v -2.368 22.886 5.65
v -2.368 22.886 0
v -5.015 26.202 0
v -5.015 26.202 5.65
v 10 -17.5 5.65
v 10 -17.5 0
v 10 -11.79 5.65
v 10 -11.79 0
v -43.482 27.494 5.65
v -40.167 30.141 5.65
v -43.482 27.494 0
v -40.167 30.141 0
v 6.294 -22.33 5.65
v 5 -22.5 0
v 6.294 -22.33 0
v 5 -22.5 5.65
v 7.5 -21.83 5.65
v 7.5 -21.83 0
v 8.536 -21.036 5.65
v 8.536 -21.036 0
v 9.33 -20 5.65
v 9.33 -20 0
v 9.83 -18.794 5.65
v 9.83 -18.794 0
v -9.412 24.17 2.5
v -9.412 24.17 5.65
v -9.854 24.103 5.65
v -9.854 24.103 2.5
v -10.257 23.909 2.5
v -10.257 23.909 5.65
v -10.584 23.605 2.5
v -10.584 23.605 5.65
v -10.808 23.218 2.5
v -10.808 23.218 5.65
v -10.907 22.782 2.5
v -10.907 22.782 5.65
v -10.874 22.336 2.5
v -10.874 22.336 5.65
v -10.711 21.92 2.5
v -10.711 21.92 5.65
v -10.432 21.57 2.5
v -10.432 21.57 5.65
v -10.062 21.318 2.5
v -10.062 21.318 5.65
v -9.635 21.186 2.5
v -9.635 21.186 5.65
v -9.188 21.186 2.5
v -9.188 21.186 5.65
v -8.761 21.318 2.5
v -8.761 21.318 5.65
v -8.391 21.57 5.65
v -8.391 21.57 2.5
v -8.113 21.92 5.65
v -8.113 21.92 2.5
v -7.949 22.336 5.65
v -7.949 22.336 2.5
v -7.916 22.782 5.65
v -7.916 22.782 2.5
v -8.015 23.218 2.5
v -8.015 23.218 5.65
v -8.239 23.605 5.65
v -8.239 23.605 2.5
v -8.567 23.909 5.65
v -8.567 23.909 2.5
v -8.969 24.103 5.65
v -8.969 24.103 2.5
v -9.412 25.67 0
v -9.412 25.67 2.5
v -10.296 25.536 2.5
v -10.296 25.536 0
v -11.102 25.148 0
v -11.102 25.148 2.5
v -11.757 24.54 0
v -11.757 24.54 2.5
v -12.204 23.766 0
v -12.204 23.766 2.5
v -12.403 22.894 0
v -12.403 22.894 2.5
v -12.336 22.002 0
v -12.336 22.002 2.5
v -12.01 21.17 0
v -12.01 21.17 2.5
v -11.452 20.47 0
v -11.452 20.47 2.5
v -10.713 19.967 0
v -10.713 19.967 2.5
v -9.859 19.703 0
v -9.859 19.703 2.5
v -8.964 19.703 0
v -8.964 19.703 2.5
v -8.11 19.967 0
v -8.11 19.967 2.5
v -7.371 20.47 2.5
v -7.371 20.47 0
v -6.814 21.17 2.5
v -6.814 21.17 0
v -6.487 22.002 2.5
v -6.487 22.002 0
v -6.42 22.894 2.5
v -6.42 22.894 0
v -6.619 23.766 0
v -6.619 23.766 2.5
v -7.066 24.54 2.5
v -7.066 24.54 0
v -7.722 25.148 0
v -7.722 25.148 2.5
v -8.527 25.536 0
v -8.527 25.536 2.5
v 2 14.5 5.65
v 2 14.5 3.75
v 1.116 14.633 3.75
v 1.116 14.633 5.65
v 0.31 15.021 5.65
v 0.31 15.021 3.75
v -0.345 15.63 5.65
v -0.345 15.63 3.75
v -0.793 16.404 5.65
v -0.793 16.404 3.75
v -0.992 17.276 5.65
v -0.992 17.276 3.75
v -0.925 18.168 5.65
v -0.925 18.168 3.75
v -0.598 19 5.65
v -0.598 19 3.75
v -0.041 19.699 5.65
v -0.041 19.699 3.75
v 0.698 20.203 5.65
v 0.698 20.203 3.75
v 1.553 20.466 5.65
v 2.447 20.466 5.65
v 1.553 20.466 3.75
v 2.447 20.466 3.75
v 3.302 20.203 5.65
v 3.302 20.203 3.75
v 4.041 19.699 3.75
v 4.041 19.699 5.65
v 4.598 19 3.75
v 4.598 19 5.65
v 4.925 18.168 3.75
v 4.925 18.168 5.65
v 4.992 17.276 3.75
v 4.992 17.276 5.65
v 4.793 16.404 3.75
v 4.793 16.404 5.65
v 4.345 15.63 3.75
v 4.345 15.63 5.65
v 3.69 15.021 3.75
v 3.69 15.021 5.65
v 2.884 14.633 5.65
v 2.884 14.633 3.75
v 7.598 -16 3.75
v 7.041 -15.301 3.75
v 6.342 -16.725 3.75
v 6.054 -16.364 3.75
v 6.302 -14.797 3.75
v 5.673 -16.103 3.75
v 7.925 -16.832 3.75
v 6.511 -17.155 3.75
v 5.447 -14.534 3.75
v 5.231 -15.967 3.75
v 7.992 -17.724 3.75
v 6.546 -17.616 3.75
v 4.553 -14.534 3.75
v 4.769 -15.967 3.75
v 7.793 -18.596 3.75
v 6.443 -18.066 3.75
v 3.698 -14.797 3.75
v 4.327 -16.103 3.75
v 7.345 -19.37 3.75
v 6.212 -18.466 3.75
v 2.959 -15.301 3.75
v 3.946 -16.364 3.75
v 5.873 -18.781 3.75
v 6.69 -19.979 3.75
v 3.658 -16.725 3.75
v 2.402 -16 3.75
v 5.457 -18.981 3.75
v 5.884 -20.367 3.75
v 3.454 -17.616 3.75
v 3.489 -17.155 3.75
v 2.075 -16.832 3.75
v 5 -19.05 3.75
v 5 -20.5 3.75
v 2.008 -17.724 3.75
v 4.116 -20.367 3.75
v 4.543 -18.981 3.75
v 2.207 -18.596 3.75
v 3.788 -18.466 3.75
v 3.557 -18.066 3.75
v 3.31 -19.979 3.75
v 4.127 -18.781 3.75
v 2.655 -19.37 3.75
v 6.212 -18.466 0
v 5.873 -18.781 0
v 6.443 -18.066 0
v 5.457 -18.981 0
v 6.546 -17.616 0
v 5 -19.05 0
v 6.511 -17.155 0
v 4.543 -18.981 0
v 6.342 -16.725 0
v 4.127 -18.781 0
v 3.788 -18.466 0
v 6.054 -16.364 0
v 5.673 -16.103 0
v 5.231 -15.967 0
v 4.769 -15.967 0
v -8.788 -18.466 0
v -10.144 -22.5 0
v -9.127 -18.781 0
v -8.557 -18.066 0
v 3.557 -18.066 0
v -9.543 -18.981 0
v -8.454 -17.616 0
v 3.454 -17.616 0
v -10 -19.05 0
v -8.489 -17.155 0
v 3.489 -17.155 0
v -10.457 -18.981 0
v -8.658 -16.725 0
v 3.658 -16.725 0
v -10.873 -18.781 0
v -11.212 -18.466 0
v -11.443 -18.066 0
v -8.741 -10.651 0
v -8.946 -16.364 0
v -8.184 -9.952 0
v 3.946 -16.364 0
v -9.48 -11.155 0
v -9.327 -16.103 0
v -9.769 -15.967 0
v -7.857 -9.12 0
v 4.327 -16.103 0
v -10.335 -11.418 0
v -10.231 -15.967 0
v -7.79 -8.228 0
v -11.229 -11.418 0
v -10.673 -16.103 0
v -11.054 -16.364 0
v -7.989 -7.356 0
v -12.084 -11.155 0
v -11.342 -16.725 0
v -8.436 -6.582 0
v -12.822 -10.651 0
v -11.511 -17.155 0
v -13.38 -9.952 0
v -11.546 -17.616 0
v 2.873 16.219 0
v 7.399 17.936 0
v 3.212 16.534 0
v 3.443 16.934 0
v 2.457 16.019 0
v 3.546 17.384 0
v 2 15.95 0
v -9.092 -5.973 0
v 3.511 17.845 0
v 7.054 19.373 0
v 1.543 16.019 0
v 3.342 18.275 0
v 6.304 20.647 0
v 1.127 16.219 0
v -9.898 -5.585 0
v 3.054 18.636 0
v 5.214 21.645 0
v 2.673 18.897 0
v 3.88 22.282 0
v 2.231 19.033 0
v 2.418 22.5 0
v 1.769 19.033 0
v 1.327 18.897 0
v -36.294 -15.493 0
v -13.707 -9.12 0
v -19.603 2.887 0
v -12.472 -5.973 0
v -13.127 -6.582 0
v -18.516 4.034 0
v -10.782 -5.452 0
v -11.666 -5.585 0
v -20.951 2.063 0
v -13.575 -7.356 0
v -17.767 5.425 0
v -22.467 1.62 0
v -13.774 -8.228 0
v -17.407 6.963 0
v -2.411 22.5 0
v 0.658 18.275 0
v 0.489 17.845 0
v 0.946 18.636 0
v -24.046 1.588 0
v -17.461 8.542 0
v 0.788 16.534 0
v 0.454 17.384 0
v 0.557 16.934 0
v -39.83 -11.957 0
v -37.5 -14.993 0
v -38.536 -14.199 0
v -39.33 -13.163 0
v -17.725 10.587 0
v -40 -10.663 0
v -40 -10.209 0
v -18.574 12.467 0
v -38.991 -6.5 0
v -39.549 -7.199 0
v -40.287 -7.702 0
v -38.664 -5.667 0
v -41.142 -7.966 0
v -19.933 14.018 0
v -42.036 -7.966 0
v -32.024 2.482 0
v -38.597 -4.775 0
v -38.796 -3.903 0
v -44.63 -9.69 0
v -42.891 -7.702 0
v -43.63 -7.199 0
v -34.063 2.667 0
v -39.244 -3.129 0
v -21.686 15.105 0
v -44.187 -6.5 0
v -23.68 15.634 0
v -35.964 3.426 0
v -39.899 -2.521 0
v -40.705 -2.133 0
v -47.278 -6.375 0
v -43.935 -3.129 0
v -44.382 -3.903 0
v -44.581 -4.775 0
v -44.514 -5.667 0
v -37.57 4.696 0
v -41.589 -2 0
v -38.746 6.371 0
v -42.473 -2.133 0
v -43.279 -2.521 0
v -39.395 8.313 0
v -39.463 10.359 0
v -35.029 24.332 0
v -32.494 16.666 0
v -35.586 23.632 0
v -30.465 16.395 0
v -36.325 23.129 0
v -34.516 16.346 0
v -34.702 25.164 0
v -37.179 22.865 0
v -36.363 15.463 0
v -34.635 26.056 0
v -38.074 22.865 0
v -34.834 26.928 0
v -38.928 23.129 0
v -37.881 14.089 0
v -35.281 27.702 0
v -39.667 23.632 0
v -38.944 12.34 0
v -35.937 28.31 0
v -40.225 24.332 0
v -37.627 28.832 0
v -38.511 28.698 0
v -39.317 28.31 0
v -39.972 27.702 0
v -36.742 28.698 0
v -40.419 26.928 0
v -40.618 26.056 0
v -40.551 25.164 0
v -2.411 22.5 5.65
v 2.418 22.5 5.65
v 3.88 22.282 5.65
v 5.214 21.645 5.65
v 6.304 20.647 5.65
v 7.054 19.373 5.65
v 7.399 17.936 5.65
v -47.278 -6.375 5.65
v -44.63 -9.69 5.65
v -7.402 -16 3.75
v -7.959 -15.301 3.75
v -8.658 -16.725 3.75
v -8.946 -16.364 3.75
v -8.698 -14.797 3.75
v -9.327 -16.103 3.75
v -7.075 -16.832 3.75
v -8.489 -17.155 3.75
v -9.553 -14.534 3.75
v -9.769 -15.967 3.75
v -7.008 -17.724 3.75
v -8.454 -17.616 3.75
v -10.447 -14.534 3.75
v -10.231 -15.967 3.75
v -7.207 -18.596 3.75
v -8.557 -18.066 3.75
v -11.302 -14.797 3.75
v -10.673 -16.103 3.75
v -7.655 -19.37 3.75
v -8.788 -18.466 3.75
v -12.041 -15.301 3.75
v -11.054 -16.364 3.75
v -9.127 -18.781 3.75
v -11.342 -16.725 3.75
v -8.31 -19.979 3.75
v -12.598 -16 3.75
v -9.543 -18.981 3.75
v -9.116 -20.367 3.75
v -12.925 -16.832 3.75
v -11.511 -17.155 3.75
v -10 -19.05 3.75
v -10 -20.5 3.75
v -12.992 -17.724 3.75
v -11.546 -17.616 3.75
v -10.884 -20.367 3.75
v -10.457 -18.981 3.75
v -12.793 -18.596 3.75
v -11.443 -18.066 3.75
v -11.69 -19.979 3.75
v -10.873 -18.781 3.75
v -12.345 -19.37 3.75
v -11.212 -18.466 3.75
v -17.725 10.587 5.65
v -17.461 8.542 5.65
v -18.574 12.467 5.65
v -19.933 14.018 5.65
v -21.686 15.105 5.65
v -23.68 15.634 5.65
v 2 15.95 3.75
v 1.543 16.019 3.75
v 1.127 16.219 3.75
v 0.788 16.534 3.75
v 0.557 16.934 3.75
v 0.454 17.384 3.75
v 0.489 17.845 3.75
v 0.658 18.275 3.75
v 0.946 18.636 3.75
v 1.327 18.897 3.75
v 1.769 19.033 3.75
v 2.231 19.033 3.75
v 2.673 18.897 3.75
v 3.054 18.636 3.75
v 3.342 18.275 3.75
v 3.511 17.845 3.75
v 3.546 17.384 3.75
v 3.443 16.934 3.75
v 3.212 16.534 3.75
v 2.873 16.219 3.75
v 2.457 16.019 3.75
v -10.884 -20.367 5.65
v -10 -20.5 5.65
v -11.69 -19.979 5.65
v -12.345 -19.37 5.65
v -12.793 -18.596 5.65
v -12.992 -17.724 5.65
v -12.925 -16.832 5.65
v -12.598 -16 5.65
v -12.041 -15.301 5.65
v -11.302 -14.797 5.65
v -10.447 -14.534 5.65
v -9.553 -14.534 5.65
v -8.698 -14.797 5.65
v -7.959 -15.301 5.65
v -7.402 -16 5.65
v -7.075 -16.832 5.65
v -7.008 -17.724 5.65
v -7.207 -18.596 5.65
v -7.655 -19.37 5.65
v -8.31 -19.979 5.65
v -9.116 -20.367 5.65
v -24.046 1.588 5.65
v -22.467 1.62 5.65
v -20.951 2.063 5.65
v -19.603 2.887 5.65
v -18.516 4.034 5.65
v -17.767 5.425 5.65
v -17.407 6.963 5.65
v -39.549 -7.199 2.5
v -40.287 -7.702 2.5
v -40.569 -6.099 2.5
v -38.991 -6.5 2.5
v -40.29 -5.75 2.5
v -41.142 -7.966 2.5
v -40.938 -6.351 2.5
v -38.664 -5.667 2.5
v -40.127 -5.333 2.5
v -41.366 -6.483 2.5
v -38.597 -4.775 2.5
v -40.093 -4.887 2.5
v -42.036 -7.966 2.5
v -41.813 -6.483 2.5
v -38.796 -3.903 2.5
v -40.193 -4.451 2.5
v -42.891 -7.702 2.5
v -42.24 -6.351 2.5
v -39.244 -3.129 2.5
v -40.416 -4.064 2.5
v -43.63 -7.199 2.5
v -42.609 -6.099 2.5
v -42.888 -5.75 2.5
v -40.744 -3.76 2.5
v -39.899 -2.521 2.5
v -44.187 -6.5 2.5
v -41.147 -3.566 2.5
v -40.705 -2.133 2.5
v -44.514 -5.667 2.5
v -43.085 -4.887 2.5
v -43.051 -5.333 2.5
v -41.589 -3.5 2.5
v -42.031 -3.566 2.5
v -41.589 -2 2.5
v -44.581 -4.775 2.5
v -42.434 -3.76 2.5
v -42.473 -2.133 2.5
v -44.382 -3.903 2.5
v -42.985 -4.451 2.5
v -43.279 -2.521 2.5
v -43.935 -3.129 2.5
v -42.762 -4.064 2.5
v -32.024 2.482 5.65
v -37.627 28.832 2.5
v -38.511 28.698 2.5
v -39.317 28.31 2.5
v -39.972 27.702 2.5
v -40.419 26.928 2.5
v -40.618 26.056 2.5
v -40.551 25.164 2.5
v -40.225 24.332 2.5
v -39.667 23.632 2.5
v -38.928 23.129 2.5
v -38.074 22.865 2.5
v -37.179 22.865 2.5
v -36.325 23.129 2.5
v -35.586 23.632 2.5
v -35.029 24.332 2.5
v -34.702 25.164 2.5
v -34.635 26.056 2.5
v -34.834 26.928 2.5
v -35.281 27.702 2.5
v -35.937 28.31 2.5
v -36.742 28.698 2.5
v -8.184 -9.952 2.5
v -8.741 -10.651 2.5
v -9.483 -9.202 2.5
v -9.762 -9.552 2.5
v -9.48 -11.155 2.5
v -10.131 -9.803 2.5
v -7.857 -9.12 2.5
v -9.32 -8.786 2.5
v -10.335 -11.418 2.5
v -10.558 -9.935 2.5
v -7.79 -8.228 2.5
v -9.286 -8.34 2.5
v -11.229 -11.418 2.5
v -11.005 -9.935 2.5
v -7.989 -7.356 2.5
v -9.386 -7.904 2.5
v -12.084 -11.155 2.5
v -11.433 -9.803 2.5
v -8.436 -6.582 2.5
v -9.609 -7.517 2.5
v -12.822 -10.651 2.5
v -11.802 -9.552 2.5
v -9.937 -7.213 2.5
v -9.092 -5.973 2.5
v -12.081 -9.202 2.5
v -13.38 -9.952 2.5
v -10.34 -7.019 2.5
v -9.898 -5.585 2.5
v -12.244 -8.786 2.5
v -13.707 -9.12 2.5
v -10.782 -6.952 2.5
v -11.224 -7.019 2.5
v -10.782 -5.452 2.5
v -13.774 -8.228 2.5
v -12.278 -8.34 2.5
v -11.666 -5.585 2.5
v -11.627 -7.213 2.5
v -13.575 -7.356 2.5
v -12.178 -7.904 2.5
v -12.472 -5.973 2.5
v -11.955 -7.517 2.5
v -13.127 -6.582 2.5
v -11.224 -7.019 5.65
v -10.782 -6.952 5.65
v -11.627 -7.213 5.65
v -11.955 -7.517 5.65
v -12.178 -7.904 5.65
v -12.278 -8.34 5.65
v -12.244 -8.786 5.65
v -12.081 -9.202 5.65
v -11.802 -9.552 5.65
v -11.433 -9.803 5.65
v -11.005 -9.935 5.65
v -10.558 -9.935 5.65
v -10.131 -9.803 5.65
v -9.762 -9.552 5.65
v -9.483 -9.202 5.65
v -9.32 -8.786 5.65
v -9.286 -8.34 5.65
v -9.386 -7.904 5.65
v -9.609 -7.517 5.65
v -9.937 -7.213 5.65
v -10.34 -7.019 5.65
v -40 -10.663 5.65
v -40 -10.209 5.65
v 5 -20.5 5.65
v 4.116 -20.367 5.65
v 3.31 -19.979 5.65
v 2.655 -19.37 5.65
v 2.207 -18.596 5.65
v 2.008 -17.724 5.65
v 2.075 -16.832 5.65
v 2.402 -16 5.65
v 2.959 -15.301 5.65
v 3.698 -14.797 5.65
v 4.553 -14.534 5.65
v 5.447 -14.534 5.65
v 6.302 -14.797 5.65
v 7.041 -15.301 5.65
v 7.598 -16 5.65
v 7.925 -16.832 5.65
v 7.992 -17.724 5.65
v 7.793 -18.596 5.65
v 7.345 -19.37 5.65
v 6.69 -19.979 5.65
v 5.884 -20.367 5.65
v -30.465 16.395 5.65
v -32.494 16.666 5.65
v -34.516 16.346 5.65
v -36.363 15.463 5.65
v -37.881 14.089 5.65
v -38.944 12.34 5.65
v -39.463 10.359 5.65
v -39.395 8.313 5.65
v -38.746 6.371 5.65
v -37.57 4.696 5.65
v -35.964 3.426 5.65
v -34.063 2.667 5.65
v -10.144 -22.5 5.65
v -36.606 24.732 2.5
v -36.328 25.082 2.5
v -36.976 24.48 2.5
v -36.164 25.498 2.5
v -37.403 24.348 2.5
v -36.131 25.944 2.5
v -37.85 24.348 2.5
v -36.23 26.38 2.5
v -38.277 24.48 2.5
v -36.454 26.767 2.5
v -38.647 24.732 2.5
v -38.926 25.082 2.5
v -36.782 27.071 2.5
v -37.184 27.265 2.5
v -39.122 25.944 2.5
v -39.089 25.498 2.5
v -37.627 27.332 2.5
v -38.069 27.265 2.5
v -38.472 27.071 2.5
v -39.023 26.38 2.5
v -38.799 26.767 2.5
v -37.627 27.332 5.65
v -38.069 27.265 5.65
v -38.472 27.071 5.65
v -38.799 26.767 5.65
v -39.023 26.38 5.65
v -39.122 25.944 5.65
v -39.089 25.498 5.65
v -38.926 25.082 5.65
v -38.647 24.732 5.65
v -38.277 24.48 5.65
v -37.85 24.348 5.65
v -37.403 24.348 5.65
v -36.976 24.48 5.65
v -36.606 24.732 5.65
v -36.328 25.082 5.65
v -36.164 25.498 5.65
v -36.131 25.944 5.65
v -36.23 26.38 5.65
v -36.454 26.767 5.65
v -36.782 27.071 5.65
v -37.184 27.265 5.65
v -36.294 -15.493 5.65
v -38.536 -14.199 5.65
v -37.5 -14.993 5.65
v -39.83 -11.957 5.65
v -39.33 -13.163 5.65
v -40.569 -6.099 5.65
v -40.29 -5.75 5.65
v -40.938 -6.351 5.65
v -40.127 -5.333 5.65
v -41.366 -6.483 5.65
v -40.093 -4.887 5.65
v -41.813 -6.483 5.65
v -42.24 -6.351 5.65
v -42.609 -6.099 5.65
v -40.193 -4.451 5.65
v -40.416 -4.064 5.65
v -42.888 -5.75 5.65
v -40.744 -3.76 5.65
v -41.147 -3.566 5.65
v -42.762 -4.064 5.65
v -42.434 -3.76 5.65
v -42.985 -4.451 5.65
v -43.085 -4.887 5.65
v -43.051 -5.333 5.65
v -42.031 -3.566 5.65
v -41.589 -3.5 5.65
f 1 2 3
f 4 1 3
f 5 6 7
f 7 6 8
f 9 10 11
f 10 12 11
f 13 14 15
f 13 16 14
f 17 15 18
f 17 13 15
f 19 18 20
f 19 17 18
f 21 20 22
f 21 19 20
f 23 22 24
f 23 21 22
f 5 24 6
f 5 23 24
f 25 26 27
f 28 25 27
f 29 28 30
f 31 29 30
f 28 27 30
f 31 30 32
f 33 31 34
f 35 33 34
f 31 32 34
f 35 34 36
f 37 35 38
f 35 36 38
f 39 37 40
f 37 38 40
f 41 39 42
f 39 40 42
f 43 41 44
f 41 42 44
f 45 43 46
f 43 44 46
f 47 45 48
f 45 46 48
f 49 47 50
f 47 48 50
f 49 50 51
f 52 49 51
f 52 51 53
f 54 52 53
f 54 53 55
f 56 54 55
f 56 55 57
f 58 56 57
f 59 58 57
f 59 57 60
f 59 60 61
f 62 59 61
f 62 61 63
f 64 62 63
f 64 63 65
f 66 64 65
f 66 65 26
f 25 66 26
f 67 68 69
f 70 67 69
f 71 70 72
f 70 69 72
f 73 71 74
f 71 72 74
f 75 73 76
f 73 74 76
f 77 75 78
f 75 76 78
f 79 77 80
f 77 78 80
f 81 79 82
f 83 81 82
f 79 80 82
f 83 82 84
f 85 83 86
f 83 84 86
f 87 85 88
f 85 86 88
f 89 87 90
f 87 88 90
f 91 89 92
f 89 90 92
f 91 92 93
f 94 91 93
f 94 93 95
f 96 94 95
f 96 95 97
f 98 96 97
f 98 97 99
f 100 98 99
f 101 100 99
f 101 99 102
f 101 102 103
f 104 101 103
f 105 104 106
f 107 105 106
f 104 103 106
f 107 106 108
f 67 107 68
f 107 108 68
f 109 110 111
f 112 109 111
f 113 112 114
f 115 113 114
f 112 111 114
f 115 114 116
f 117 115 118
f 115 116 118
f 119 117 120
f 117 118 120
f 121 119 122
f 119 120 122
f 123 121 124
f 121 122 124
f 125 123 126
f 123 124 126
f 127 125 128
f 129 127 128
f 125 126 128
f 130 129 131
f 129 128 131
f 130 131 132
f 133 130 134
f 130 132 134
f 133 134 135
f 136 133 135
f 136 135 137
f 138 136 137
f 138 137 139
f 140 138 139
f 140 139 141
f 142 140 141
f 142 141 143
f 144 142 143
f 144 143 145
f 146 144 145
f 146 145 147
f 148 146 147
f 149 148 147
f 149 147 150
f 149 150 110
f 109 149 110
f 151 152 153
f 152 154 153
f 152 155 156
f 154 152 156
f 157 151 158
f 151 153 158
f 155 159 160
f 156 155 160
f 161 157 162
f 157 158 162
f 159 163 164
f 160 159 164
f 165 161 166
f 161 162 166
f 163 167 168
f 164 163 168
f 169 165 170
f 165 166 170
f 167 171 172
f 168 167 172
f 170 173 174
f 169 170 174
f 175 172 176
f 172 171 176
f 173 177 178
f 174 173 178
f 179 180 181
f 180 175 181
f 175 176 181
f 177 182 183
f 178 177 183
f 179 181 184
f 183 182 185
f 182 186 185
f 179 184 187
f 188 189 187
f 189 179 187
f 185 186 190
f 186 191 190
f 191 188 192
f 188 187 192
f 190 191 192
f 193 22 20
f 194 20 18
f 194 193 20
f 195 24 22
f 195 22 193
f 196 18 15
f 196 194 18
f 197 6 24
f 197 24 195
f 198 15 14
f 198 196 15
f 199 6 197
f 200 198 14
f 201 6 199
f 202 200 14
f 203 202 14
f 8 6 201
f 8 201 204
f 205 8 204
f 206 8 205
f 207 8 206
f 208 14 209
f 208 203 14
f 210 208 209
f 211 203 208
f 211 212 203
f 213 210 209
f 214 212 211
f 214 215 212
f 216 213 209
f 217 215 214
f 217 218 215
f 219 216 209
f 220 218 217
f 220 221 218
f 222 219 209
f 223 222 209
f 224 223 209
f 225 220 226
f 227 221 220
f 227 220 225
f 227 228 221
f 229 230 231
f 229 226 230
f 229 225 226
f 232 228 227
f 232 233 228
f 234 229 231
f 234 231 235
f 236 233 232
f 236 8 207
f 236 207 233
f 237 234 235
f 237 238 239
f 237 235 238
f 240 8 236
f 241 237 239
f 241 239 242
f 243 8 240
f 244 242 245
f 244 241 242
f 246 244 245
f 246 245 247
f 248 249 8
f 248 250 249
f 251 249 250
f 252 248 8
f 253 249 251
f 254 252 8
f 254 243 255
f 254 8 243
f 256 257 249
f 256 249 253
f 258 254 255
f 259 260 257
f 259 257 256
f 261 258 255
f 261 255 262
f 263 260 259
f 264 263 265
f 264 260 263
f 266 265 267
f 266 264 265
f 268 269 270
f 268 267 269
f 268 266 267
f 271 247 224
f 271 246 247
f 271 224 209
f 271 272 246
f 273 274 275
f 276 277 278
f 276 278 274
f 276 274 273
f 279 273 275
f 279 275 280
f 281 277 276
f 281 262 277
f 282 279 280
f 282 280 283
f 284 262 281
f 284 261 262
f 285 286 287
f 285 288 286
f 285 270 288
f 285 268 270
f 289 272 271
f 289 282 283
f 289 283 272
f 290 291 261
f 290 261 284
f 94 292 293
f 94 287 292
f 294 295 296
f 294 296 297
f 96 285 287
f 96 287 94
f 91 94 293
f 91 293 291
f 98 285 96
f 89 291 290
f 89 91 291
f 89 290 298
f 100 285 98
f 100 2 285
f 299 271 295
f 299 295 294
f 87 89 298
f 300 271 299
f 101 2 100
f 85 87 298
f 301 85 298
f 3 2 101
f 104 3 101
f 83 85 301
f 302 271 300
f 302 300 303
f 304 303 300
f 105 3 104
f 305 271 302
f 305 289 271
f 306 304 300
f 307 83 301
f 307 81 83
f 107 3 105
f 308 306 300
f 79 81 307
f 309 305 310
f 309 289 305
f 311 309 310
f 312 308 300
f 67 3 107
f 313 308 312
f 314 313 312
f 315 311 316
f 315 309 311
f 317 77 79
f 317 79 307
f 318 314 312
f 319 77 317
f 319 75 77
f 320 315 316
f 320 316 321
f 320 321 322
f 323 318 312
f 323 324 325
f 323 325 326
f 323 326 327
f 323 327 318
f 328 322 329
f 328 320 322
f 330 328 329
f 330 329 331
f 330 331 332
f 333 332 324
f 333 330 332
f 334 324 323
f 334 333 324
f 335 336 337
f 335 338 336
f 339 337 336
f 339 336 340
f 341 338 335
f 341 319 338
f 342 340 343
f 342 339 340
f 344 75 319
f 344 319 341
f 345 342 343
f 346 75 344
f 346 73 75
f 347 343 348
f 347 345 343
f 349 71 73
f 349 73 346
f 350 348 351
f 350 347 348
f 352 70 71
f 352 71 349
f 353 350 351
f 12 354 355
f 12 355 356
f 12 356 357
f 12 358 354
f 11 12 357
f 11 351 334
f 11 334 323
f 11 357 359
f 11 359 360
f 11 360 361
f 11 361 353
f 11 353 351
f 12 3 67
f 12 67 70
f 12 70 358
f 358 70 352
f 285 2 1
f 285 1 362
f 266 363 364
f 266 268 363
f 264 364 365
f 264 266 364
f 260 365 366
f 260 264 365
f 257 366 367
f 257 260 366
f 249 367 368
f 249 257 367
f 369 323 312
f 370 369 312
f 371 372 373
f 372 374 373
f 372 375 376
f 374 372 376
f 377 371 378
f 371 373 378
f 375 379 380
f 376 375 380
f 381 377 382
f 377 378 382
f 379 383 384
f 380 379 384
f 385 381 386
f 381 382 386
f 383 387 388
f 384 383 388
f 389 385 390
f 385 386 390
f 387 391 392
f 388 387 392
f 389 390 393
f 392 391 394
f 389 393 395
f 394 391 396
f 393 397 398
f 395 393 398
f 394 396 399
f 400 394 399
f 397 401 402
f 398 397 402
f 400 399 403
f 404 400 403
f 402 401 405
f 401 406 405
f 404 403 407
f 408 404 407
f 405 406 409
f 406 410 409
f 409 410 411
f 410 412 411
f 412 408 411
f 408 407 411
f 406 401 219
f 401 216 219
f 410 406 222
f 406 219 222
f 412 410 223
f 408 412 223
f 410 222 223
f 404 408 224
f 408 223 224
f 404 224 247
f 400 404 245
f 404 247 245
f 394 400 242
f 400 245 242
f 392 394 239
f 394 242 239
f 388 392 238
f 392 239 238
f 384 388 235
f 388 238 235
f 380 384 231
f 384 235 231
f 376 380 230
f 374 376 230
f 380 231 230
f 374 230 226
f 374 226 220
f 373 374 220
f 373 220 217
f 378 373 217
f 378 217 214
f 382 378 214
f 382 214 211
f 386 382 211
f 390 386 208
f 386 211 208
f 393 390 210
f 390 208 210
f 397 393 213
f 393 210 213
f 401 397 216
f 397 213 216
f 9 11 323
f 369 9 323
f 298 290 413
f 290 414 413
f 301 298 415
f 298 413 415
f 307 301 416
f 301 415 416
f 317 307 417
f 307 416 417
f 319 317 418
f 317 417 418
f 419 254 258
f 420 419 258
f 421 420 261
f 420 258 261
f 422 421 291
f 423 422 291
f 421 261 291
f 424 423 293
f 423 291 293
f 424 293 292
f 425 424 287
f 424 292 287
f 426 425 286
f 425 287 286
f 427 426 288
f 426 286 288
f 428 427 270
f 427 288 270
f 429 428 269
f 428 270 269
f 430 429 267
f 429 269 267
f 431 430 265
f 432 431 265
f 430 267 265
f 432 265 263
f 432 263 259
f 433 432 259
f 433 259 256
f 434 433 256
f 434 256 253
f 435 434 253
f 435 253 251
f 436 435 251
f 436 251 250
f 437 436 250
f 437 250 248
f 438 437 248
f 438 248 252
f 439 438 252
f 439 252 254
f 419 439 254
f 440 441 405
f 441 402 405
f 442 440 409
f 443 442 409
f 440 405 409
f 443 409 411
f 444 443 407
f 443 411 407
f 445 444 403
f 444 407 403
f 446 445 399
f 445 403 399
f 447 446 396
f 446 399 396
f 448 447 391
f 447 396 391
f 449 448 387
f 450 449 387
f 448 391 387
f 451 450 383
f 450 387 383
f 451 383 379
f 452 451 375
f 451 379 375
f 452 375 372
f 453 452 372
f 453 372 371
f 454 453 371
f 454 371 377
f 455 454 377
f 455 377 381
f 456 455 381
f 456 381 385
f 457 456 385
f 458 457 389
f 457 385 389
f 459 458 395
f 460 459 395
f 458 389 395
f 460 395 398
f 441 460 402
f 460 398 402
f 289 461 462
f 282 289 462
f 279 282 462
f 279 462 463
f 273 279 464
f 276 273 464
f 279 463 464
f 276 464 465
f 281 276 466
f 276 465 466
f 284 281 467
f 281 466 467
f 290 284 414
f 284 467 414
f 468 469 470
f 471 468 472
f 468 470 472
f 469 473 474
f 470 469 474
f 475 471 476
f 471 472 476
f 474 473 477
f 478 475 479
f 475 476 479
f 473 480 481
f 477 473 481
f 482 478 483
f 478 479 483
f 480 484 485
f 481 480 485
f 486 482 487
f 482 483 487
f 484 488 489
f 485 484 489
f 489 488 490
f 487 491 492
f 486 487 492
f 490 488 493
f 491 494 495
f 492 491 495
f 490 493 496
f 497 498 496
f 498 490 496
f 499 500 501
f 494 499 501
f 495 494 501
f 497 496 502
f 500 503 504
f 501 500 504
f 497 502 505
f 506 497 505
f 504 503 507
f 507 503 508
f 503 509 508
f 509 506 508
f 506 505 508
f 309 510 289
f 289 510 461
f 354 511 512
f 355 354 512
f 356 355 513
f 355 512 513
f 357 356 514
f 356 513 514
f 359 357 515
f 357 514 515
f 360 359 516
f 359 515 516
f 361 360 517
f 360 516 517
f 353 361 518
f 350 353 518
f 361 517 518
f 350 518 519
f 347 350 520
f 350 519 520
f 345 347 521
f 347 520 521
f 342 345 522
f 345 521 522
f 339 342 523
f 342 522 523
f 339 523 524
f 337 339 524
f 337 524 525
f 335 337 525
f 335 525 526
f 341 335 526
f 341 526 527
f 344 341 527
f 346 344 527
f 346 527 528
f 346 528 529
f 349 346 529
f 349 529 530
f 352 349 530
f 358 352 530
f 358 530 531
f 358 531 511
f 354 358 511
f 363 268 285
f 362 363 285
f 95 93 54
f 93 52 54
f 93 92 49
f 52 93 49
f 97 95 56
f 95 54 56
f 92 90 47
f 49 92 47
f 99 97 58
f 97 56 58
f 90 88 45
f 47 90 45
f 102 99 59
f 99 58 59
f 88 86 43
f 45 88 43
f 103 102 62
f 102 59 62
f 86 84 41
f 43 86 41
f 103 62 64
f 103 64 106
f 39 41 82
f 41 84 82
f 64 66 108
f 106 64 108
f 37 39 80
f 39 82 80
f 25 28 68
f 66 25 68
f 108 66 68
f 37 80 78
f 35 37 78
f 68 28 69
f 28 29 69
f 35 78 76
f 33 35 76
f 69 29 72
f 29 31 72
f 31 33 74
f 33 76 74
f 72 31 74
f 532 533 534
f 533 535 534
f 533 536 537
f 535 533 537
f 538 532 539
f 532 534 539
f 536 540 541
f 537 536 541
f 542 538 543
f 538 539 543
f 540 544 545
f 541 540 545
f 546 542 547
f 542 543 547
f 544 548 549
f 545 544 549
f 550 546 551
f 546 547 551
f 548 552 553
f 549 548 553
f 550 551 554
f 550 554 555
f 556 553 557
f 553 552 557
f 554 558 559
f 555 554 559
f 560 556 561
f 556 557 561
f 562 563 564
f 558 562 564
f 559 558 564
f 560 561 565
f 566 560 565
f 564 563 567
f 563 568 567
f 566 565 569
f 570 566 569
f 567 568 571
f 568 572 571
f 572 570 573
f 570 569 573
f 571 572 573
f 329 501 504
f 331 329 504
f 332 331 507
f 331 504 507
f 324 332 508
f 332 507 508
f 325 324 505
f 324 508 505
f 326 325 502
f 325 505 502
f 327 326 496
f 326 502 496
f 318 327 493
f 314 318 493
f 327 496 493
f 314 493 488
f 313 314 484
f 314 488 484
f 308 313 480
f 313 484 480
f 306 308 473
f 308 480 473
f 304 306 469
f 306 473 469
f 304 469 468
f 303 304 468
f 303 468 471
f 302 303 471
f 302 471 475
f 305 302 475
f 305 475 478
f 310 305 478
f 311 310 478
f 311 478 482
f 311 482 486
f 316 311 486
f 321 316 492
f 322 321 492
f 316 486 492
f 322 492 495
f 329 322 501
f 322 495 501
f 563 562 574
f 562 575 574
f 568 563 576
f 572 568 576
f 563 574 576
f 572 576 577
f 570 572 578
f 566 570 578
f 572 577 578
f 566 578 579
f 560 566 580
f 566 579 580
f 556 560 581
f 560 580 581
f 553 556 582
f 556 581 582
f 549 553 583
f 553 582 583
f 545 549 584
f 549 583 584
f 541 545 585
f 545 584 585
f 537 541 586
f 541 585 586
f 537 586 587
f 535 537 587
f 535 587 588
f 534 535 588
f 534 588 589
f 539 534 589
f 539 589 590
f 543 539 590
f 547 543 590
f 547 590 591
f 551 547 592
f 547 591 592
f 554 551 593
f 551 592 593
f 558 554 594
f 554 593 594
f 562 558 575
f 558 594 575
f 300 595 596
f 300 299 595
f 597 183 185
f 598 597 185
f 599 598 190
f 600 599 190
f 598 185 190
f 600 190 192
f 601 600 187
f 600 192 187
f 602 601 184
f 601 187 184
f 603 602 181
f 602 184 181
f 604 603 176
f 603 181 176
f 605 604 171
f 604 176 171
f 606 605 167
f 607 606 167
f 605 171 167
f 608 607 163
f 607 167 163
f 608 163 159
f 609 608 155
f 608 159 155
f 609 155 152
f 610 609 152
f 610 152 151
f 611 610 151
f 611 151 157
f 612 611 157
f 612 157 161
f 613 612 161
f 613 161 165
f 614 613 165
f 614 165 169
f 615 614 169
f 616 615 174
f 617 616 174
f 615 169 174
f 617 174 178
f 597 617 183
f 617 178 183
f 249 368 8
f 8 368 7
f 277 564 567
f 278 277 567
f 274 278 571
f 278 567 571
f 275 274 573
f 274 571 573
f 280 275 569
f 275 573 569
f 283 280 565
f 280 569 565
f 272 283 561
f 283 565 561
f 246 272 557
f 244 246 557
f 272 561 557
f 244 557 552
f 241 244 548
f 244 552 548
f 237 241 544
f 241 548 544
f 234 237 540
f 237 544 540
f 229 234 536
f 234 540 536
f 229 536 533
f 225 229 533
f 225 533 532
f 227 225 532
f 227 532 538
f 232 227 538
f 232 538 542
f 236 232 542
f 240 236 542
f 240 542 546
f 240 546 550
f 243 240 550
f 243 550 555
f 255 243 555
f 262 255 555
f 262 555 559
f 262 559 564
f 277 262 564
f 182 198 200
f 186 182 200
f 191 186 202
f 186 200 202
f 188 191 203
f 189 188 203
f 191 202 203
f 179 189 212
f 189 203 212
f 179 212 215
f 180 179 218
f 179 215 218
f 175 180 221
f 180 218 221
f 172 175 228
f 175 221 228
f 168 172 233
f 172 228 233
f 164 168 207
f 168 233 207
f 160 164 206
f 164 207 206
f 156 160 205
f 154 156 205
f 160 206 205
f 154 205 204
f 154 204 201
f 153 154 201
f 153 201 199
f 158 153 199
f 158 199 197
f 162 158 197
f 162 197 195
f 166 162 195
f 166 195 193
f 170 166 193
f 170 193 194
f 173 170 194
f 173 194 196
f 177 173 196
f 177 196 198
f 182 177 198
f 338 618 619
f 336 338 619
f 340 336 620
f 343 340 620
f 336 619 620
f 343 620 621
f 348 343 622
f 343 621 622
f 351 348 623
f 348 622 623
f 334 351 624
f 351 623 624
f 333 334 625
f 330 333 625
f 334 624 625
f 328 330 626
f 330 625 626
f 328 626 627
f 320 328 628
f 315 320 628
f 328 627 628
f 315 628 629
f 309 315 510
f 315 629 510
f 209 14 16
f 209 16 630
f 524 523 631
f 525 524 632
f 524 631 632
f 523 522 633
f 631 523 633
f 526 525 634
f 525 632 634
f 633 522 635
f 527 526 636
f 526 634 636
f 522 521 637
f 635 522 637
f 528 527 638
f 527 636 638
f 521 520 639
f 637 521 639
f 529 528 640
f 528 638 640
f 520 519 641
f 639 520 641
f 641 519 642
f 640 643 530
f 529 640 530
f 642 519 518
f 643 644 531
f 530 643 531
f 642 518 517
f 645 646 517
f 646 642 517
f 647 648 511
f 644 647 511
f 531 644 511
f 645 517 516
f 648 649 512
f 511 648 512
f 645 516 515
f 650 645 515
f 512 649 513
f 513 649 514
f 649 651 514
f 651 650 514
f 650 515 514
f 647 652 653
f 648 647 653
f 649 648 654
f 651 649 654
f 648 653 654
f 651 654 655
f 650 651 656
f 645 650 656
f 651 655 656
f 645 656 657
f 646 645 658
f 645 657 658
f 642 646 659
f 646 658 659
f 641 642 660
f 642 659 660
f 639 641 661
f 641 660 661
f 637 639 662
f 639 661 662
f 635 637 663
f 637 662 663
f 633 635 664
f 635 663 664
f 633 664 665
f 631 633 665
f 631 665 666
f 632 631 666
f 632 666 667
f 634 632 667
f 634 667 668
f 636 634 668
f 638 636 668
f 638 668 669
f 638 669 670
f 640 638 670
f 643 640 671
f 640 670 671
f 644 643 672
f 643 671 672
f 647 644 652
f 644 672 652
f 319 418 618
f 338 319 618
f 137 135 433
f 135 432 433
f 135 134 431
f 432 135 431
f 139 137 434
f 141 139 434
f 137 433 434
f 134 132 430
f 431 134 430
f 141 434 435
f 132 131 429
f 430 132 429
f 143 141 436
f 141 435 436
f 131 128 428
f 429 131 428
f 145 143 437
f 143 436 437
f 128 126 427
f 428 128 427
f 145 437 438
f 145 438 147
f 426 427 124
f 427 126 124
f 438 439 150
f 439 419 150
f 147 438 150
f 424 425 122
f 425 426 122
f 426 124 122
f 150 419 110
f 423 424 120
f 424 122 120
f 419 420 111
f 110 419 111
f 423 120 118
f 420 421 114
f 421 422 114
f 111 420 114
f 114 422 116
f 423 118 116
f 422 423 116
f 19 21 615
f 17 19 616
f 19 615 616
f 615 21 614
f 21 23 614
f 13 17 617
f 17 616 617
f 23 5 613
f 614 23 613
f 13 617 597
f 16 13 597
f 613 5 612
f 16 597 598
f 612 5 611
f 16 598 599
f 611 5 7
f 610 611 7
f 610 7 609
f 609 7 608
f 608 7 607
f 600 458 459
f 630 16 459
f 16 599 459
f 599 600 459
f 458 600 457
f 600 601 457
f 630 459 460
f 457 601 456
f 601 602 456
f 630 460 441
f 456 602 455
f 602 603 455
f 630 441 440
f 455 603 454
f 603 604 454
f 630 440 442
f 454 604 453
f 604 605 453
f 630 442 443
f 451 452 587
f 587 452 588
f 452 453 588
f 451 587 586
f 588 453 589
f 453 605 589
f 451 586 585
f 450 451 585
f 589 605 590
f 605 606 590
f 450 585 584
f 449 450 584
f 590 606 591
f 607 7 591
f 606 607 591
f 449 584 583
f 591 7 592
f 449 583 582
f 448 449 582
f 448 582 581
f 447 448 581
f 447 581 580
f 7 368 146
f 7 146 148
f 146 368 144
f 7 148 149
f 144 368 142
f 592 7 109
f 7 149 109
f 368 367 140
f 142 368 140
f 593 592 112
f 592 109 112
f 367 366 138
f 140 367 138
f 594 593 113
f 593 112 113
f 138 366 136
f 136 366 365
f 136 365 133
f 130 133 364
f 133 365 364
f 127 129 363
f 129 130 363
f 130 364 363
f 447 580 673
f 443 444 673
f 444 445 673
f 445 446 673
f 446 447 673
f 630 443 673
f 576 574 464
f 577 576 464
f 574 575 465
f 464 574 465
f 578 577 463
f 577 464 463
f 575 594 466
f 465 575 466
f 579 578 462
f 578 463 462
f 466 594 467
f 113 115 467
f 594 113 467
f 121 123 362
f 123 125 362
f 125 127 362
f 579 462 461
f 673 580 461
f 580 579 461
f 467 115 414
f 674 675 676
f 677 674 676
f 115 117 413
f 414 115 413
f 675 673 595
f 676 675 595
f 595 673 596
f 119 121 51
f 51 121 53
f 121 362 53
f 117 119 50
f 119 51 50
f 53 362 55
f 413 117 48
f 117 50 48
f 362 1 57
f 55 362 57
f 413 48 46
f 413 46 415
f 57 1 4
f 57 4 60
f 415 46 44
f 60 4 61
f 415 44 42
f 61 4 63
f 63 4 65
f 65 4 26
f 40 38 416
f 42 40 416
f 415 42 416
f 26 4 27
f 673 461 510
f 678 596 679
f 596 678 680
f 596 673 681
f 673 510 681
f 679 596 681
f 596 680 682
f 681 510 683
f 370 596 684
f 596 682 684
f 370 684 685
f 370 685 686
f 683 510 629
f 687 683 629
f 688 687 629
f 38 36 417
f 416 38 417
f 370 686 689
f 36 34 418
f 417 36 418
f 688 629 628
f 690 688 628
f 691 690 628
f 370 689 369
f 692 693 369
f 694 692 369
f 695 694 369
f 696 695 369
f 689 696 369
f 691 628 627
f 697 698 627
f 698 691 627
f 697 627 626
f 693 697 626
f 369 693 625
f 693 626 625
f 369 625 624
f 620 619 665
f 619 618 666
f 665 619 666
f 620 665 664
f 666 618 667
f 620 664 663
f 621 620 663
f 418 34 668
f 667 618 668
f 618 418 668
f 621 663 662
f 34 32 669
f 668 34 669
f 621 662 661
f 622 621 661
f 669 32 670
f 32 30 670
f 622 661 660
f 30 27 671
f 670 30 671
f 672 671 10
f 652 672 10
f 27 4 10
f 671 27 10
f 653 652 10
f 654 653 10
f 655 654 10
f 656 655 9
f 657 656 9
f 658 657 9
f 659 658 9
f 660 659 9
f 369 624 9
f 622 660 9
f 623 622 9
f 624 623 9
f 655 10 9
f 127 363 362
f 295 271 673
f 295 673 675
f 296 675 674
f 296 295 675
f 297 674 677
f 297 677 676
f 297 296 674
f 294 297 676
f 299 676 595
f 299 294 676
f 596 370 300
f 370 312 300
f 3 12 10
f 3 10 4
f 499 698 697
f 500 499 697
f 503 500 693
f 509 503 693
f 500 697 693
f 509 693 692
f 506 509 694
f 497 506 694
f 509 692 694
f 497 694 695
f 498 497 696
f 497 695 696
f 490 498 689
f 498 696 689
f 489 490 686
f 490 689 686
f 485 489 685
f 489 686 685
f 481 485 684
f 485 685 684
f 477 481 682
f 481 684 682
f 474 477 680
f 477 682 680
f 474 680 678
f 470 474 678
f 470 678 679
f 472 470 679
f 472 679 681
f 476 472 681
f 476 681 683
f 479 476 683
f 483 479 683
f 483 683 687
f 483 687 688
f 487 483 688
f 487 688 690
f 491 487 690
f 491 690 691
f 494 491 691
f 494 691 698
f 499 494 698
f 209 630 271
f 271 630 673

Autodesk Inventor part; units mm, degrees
ref_plane "YZ Plane" through (0, 0, 0) normal (1, 0, 0) x (0, 1, 0)
ref_plane "XZ Plane" through (0, 0, 0) normal (0, 1, 0) x (-1, 0, 0)
ref_plane "XY Plane" through (0, 0, 0) normal (0, 0, 1) x (1, 0, 0)
ref_plane "Work Plane2" through (0, 0, 0) normal (0, 0, 1) x (1, 0, 0)
sketch "Sketch1" plane through (0, 0, 0) normal (0, 0, 1) x (1, 0, 0)
  line L0 (-10, 22.5) -> (10, 22.5)
  line L1 (10, 22.5) -> (10, -22.5)
  line L2 (10, -22.5) -> (-10, -22.5)
  line L3 (-10, -22.5) -> (-10, 22.5)
  circle A0 centre (0, 17.5) radius 1.25
  circle A1 centre (5, -17.5) radius 1.25
  point P0 (0, 0)
  dimension "d38" = 20
  dimension "d39" = 45
  dimension "d40" = 2.5
  dimension "d41" = 2.5
  dimension "d42" = 10
  dimension "d43" = 5
  dimension "d44" = 5
  dimension "d45" = 5
extrude "Extrusion1" add sketch "Sketch1" along normal blind 3.65 contours L0 L1 L2 L3 | A0 | A1
sketch "Sketch2" plane through (-10, 118.2358, 3.65) normal (-1, 0, 0) x (0, 0, 1)
  line L0 (-3.65, -95.7358) -> (-3.65, -140.7358) projected
  line L1 (-3.65, -140.7358) -> (0, -140.7358) projected
  line L2 (0, -95.7358) -> (0, -140.7358) projected
  line L3 (-3.65, -95.7358) -> (0, -95.7358) projected
  point P0 (-3.65, -118.2358)
extrude "Extrusion2" add sketch "Sketch2" along normal blind 30
sketch "Sketch3" plane through (0, 0, 3.65) normal (0, 0, 1) x (1, 0, 0)
  line L0 (10, -22.5) -> (10, 22.5) projected
  line L1 (10, 22.5) -> (-40, 22.5) projected
  line L2 (-40, -22.5) -> (-40, 22.5) projected
  line L3 (10, -22.5) -> (-40, -22.5) projected
  circle A0 centre (0, 17.5) radius 3 construction
  circle A1 centre (5, -17.5) radius 3 construction
  point P0 (0, 0)
  dimension "d48" = 6
  dimension "d49" = 6
extrude "Extrusion3" add sketch "Sketch3" along normal blind 2
ref_plane "Work Plane3" through (0, 0, 0) normal (0, 0, -1) x (-1, 0, 0)
sketch "Sketch10" plane through (0, 0, 5.65) normal (0, 0, 1) x (1, 0, 0)
  circle A0 centre (-10, -17.5) radius 2.5953
  line L0 (-40, -22.5) -> (10, -22.5) projected
  line L1 (10, -22.5) -> (10, 22.5) projected
  circle A1 centre (5, -17.5) radius 2.5953
  circle A2 centre (2, 17.5) radius 2.5953
  line L2 (10, 22.5) -> (-40, 22.5) projected
  point P0 (0, 0)
  dimension "d75" = 5
  dimension "d76" = 20
  dimension "d77" = 8
  dimension "d78" = 5
  dimension "d79" = 5
  dimension "d80" = 5
hole "Hole4" at (-10, -17.5, 5.65) at (5, -17.5, 5.65) at (2, 17.5, 5.65) direction (0, 0, -1) diameter 3.1 end through all counterbore diameter 6 counterbore depth 1.9
sketch "Sketch11" plane through (0, 0, 5.65) normal (0, 0, 1) x (1, 0, 0)
  circle A0 centre (5, -17.5) radius 3 projected
  circle A1 centre (-10, -17.5) radius 3 projected
  circle A2 centre (2, 17.5) radius 3 projected
  line L0 (-40, -22.5) -> (10, -22.5) projected
  line L1 (10, -22.5) -> (10, 22.5) projected
  line L2 (10, 22.5) -> (-40, 22.5) projected
  line L3 (-40, 22.5) -> (-40, -22.5) projected
  line L4 (-40, -22.5) -> (10, -22.5) projected
  line L5 (-10.1436, -22.5) -> (-40, -14.5)
  line L6 (10, 22.5) -> (-40, 22.5) projected
  line L7 (7, 22.5) -> (10, -11.7902)
  point P0 (0, 0)
  dimension "d81" = 15
  dimension "d82" = 8
  dimension "d83" = 5
  dimension "d84" = 3
extrude "Extrusion7" cut sketch "Sketch11" against normal through all contours L3 L5 L0 | L7 L2 L1
fillet "Fillet1" radius 5 3 edges at (10, -22.5, 2.825) (7, 22.5, 2.825) (-40, -14.5, 2.825)
sketch "Sketch12" plane through (0, 0, 5.65) normal (0, 0, 1) x (1, 0, 0)
  arc A0 (-24.0463, 1.5877) -> (-17.4606, 8.5418) centre (-23.3781, 7.5504) ccw
  arc A1 (-17.4606, 8.5418) -> (-23.6797, 15.6342) centre (-24.4593, 8.6778) ccw
  arc A2 (-30.4648, 16.3946) -> (-32.024, 2.4817) centre (-32.4095, 9.5688) ccw
  line L0 (-32.024, 2.4817) -> (-24.0463, 1.5877)
  line L1 (-23.6797, 15.6342) -> (-30.4648, 16.3946)
  point P0 (0, 0)
extrude "Extrusion8" cut sketch "Sketch12" against normal through all
sketch "Sketch13" plane through (0, 0, 0) normal (0, 0, -1) x (-1, 0, 0)
  arc A0 (32.024, 2.4817) -> (30.4648, 16.3946) centre (32.4095, 9.5688) ccw projected
  line L0 (32.024, 2.4817) -> (24.0463, 1.5877) projected
  arc A1 (17.4606, 8.5418) -> (24.0463, 1.5877) centre (23.3781, 7.5504) ccw projected
  arc A2 (23.6797, 15.6342) -> (17.4606, 8.5418) centre (24.4593, 8.6778) ccw projected
  line L1 (23.6797, 15.6342) -> (30.4648, 16.3946) projected
  arc A3 (36.2941, -15.493) -> (40, -10.6634) centre (35, -10.6634) ccw projected
  line L2 (40, 22.5) -> (40, -10.6634) projected
  line L3 (-2.4183, 22.5) -> (40, 22.5) projected
  arc A4 (-2.4183, 22.5) -> (-7.3993, 17.9358) centre (-2.4183, 17.5) ccw projected
  line L4 (-7.3993, 17.9358) -> (-10, -11.7902) projected
  line L5 (-10, -17.5) -> (-10, -11.7902) projected
  arc A5 (-10, -17.5) -> (-5, -22.5) centre (-5, -17.5) ccw projected
  line L6 (-5, -22.5) -> (10.1436, -22.5) projected
  line L7 (10.1436, -22.5) -> (36.2941, -15.493) projected
  circle A6 centre (-5, -17.5) radius 1.55 projected
  circle A7 centre (10, -17.5) radius 1.55 projected
  circle A8 centre (-2, 17.5) radius 1.55 projected
  line L8 (2.3679, 22.8864) -> (2.6218, 20.62)
  line L9 (2.3679, 22.8864) -> (5.0151, 26.2019)
  line L10 (40.1666, 30.1412) -> (5.0151, 26.2019)
  line L11 (40.1666, 30.1412) -> (43.482, 27.494)
  line L12 (43.482, 27.494) -> (47.2776, -6.3746)
  line L13 (47.2776, -6.3746) -> (44.6304, -9.69)
  line L14 (44.6304, -9.69) -> (34.1957, -10.8594)
  point P0 (0, 0)
  point P1 (2.4112, 22.5)
  point P2 (40, -10.2089)
extrude "Extrusion9" add sketch "Sketch13" against normal up to surface (5.65 mm away) contours L2 L3 L8 L9 L10 L11 L12 L13 L14
sketch "Sketch14" plane through (0, 0, 0) normal (0, 0, -1) x (-1, 0, 0)
  circle A0 centre (37.6266, 25.8315) radius 1.7
  circle A1 centre (9.4116, 22.6695) radius 1.7
  circle A2 centre (10.7819, -8.452) radius 2.205
  circle A3 centre (41.5891, -4.9995) radius 1.7
  point P0 (0, 0)
hole "Hole5" at (-9.4116, 22.6695, 0) at (-37.6266, 25.8315, 0) at (-41.5891, -4.9995, 0) at (-10.7819, -8.452, 0) direction (0, 0, 1) diameter 3 end through all counterbore diameter 6 counterbore depth 2.5
properties part number "BOWDEN MOUNT"
